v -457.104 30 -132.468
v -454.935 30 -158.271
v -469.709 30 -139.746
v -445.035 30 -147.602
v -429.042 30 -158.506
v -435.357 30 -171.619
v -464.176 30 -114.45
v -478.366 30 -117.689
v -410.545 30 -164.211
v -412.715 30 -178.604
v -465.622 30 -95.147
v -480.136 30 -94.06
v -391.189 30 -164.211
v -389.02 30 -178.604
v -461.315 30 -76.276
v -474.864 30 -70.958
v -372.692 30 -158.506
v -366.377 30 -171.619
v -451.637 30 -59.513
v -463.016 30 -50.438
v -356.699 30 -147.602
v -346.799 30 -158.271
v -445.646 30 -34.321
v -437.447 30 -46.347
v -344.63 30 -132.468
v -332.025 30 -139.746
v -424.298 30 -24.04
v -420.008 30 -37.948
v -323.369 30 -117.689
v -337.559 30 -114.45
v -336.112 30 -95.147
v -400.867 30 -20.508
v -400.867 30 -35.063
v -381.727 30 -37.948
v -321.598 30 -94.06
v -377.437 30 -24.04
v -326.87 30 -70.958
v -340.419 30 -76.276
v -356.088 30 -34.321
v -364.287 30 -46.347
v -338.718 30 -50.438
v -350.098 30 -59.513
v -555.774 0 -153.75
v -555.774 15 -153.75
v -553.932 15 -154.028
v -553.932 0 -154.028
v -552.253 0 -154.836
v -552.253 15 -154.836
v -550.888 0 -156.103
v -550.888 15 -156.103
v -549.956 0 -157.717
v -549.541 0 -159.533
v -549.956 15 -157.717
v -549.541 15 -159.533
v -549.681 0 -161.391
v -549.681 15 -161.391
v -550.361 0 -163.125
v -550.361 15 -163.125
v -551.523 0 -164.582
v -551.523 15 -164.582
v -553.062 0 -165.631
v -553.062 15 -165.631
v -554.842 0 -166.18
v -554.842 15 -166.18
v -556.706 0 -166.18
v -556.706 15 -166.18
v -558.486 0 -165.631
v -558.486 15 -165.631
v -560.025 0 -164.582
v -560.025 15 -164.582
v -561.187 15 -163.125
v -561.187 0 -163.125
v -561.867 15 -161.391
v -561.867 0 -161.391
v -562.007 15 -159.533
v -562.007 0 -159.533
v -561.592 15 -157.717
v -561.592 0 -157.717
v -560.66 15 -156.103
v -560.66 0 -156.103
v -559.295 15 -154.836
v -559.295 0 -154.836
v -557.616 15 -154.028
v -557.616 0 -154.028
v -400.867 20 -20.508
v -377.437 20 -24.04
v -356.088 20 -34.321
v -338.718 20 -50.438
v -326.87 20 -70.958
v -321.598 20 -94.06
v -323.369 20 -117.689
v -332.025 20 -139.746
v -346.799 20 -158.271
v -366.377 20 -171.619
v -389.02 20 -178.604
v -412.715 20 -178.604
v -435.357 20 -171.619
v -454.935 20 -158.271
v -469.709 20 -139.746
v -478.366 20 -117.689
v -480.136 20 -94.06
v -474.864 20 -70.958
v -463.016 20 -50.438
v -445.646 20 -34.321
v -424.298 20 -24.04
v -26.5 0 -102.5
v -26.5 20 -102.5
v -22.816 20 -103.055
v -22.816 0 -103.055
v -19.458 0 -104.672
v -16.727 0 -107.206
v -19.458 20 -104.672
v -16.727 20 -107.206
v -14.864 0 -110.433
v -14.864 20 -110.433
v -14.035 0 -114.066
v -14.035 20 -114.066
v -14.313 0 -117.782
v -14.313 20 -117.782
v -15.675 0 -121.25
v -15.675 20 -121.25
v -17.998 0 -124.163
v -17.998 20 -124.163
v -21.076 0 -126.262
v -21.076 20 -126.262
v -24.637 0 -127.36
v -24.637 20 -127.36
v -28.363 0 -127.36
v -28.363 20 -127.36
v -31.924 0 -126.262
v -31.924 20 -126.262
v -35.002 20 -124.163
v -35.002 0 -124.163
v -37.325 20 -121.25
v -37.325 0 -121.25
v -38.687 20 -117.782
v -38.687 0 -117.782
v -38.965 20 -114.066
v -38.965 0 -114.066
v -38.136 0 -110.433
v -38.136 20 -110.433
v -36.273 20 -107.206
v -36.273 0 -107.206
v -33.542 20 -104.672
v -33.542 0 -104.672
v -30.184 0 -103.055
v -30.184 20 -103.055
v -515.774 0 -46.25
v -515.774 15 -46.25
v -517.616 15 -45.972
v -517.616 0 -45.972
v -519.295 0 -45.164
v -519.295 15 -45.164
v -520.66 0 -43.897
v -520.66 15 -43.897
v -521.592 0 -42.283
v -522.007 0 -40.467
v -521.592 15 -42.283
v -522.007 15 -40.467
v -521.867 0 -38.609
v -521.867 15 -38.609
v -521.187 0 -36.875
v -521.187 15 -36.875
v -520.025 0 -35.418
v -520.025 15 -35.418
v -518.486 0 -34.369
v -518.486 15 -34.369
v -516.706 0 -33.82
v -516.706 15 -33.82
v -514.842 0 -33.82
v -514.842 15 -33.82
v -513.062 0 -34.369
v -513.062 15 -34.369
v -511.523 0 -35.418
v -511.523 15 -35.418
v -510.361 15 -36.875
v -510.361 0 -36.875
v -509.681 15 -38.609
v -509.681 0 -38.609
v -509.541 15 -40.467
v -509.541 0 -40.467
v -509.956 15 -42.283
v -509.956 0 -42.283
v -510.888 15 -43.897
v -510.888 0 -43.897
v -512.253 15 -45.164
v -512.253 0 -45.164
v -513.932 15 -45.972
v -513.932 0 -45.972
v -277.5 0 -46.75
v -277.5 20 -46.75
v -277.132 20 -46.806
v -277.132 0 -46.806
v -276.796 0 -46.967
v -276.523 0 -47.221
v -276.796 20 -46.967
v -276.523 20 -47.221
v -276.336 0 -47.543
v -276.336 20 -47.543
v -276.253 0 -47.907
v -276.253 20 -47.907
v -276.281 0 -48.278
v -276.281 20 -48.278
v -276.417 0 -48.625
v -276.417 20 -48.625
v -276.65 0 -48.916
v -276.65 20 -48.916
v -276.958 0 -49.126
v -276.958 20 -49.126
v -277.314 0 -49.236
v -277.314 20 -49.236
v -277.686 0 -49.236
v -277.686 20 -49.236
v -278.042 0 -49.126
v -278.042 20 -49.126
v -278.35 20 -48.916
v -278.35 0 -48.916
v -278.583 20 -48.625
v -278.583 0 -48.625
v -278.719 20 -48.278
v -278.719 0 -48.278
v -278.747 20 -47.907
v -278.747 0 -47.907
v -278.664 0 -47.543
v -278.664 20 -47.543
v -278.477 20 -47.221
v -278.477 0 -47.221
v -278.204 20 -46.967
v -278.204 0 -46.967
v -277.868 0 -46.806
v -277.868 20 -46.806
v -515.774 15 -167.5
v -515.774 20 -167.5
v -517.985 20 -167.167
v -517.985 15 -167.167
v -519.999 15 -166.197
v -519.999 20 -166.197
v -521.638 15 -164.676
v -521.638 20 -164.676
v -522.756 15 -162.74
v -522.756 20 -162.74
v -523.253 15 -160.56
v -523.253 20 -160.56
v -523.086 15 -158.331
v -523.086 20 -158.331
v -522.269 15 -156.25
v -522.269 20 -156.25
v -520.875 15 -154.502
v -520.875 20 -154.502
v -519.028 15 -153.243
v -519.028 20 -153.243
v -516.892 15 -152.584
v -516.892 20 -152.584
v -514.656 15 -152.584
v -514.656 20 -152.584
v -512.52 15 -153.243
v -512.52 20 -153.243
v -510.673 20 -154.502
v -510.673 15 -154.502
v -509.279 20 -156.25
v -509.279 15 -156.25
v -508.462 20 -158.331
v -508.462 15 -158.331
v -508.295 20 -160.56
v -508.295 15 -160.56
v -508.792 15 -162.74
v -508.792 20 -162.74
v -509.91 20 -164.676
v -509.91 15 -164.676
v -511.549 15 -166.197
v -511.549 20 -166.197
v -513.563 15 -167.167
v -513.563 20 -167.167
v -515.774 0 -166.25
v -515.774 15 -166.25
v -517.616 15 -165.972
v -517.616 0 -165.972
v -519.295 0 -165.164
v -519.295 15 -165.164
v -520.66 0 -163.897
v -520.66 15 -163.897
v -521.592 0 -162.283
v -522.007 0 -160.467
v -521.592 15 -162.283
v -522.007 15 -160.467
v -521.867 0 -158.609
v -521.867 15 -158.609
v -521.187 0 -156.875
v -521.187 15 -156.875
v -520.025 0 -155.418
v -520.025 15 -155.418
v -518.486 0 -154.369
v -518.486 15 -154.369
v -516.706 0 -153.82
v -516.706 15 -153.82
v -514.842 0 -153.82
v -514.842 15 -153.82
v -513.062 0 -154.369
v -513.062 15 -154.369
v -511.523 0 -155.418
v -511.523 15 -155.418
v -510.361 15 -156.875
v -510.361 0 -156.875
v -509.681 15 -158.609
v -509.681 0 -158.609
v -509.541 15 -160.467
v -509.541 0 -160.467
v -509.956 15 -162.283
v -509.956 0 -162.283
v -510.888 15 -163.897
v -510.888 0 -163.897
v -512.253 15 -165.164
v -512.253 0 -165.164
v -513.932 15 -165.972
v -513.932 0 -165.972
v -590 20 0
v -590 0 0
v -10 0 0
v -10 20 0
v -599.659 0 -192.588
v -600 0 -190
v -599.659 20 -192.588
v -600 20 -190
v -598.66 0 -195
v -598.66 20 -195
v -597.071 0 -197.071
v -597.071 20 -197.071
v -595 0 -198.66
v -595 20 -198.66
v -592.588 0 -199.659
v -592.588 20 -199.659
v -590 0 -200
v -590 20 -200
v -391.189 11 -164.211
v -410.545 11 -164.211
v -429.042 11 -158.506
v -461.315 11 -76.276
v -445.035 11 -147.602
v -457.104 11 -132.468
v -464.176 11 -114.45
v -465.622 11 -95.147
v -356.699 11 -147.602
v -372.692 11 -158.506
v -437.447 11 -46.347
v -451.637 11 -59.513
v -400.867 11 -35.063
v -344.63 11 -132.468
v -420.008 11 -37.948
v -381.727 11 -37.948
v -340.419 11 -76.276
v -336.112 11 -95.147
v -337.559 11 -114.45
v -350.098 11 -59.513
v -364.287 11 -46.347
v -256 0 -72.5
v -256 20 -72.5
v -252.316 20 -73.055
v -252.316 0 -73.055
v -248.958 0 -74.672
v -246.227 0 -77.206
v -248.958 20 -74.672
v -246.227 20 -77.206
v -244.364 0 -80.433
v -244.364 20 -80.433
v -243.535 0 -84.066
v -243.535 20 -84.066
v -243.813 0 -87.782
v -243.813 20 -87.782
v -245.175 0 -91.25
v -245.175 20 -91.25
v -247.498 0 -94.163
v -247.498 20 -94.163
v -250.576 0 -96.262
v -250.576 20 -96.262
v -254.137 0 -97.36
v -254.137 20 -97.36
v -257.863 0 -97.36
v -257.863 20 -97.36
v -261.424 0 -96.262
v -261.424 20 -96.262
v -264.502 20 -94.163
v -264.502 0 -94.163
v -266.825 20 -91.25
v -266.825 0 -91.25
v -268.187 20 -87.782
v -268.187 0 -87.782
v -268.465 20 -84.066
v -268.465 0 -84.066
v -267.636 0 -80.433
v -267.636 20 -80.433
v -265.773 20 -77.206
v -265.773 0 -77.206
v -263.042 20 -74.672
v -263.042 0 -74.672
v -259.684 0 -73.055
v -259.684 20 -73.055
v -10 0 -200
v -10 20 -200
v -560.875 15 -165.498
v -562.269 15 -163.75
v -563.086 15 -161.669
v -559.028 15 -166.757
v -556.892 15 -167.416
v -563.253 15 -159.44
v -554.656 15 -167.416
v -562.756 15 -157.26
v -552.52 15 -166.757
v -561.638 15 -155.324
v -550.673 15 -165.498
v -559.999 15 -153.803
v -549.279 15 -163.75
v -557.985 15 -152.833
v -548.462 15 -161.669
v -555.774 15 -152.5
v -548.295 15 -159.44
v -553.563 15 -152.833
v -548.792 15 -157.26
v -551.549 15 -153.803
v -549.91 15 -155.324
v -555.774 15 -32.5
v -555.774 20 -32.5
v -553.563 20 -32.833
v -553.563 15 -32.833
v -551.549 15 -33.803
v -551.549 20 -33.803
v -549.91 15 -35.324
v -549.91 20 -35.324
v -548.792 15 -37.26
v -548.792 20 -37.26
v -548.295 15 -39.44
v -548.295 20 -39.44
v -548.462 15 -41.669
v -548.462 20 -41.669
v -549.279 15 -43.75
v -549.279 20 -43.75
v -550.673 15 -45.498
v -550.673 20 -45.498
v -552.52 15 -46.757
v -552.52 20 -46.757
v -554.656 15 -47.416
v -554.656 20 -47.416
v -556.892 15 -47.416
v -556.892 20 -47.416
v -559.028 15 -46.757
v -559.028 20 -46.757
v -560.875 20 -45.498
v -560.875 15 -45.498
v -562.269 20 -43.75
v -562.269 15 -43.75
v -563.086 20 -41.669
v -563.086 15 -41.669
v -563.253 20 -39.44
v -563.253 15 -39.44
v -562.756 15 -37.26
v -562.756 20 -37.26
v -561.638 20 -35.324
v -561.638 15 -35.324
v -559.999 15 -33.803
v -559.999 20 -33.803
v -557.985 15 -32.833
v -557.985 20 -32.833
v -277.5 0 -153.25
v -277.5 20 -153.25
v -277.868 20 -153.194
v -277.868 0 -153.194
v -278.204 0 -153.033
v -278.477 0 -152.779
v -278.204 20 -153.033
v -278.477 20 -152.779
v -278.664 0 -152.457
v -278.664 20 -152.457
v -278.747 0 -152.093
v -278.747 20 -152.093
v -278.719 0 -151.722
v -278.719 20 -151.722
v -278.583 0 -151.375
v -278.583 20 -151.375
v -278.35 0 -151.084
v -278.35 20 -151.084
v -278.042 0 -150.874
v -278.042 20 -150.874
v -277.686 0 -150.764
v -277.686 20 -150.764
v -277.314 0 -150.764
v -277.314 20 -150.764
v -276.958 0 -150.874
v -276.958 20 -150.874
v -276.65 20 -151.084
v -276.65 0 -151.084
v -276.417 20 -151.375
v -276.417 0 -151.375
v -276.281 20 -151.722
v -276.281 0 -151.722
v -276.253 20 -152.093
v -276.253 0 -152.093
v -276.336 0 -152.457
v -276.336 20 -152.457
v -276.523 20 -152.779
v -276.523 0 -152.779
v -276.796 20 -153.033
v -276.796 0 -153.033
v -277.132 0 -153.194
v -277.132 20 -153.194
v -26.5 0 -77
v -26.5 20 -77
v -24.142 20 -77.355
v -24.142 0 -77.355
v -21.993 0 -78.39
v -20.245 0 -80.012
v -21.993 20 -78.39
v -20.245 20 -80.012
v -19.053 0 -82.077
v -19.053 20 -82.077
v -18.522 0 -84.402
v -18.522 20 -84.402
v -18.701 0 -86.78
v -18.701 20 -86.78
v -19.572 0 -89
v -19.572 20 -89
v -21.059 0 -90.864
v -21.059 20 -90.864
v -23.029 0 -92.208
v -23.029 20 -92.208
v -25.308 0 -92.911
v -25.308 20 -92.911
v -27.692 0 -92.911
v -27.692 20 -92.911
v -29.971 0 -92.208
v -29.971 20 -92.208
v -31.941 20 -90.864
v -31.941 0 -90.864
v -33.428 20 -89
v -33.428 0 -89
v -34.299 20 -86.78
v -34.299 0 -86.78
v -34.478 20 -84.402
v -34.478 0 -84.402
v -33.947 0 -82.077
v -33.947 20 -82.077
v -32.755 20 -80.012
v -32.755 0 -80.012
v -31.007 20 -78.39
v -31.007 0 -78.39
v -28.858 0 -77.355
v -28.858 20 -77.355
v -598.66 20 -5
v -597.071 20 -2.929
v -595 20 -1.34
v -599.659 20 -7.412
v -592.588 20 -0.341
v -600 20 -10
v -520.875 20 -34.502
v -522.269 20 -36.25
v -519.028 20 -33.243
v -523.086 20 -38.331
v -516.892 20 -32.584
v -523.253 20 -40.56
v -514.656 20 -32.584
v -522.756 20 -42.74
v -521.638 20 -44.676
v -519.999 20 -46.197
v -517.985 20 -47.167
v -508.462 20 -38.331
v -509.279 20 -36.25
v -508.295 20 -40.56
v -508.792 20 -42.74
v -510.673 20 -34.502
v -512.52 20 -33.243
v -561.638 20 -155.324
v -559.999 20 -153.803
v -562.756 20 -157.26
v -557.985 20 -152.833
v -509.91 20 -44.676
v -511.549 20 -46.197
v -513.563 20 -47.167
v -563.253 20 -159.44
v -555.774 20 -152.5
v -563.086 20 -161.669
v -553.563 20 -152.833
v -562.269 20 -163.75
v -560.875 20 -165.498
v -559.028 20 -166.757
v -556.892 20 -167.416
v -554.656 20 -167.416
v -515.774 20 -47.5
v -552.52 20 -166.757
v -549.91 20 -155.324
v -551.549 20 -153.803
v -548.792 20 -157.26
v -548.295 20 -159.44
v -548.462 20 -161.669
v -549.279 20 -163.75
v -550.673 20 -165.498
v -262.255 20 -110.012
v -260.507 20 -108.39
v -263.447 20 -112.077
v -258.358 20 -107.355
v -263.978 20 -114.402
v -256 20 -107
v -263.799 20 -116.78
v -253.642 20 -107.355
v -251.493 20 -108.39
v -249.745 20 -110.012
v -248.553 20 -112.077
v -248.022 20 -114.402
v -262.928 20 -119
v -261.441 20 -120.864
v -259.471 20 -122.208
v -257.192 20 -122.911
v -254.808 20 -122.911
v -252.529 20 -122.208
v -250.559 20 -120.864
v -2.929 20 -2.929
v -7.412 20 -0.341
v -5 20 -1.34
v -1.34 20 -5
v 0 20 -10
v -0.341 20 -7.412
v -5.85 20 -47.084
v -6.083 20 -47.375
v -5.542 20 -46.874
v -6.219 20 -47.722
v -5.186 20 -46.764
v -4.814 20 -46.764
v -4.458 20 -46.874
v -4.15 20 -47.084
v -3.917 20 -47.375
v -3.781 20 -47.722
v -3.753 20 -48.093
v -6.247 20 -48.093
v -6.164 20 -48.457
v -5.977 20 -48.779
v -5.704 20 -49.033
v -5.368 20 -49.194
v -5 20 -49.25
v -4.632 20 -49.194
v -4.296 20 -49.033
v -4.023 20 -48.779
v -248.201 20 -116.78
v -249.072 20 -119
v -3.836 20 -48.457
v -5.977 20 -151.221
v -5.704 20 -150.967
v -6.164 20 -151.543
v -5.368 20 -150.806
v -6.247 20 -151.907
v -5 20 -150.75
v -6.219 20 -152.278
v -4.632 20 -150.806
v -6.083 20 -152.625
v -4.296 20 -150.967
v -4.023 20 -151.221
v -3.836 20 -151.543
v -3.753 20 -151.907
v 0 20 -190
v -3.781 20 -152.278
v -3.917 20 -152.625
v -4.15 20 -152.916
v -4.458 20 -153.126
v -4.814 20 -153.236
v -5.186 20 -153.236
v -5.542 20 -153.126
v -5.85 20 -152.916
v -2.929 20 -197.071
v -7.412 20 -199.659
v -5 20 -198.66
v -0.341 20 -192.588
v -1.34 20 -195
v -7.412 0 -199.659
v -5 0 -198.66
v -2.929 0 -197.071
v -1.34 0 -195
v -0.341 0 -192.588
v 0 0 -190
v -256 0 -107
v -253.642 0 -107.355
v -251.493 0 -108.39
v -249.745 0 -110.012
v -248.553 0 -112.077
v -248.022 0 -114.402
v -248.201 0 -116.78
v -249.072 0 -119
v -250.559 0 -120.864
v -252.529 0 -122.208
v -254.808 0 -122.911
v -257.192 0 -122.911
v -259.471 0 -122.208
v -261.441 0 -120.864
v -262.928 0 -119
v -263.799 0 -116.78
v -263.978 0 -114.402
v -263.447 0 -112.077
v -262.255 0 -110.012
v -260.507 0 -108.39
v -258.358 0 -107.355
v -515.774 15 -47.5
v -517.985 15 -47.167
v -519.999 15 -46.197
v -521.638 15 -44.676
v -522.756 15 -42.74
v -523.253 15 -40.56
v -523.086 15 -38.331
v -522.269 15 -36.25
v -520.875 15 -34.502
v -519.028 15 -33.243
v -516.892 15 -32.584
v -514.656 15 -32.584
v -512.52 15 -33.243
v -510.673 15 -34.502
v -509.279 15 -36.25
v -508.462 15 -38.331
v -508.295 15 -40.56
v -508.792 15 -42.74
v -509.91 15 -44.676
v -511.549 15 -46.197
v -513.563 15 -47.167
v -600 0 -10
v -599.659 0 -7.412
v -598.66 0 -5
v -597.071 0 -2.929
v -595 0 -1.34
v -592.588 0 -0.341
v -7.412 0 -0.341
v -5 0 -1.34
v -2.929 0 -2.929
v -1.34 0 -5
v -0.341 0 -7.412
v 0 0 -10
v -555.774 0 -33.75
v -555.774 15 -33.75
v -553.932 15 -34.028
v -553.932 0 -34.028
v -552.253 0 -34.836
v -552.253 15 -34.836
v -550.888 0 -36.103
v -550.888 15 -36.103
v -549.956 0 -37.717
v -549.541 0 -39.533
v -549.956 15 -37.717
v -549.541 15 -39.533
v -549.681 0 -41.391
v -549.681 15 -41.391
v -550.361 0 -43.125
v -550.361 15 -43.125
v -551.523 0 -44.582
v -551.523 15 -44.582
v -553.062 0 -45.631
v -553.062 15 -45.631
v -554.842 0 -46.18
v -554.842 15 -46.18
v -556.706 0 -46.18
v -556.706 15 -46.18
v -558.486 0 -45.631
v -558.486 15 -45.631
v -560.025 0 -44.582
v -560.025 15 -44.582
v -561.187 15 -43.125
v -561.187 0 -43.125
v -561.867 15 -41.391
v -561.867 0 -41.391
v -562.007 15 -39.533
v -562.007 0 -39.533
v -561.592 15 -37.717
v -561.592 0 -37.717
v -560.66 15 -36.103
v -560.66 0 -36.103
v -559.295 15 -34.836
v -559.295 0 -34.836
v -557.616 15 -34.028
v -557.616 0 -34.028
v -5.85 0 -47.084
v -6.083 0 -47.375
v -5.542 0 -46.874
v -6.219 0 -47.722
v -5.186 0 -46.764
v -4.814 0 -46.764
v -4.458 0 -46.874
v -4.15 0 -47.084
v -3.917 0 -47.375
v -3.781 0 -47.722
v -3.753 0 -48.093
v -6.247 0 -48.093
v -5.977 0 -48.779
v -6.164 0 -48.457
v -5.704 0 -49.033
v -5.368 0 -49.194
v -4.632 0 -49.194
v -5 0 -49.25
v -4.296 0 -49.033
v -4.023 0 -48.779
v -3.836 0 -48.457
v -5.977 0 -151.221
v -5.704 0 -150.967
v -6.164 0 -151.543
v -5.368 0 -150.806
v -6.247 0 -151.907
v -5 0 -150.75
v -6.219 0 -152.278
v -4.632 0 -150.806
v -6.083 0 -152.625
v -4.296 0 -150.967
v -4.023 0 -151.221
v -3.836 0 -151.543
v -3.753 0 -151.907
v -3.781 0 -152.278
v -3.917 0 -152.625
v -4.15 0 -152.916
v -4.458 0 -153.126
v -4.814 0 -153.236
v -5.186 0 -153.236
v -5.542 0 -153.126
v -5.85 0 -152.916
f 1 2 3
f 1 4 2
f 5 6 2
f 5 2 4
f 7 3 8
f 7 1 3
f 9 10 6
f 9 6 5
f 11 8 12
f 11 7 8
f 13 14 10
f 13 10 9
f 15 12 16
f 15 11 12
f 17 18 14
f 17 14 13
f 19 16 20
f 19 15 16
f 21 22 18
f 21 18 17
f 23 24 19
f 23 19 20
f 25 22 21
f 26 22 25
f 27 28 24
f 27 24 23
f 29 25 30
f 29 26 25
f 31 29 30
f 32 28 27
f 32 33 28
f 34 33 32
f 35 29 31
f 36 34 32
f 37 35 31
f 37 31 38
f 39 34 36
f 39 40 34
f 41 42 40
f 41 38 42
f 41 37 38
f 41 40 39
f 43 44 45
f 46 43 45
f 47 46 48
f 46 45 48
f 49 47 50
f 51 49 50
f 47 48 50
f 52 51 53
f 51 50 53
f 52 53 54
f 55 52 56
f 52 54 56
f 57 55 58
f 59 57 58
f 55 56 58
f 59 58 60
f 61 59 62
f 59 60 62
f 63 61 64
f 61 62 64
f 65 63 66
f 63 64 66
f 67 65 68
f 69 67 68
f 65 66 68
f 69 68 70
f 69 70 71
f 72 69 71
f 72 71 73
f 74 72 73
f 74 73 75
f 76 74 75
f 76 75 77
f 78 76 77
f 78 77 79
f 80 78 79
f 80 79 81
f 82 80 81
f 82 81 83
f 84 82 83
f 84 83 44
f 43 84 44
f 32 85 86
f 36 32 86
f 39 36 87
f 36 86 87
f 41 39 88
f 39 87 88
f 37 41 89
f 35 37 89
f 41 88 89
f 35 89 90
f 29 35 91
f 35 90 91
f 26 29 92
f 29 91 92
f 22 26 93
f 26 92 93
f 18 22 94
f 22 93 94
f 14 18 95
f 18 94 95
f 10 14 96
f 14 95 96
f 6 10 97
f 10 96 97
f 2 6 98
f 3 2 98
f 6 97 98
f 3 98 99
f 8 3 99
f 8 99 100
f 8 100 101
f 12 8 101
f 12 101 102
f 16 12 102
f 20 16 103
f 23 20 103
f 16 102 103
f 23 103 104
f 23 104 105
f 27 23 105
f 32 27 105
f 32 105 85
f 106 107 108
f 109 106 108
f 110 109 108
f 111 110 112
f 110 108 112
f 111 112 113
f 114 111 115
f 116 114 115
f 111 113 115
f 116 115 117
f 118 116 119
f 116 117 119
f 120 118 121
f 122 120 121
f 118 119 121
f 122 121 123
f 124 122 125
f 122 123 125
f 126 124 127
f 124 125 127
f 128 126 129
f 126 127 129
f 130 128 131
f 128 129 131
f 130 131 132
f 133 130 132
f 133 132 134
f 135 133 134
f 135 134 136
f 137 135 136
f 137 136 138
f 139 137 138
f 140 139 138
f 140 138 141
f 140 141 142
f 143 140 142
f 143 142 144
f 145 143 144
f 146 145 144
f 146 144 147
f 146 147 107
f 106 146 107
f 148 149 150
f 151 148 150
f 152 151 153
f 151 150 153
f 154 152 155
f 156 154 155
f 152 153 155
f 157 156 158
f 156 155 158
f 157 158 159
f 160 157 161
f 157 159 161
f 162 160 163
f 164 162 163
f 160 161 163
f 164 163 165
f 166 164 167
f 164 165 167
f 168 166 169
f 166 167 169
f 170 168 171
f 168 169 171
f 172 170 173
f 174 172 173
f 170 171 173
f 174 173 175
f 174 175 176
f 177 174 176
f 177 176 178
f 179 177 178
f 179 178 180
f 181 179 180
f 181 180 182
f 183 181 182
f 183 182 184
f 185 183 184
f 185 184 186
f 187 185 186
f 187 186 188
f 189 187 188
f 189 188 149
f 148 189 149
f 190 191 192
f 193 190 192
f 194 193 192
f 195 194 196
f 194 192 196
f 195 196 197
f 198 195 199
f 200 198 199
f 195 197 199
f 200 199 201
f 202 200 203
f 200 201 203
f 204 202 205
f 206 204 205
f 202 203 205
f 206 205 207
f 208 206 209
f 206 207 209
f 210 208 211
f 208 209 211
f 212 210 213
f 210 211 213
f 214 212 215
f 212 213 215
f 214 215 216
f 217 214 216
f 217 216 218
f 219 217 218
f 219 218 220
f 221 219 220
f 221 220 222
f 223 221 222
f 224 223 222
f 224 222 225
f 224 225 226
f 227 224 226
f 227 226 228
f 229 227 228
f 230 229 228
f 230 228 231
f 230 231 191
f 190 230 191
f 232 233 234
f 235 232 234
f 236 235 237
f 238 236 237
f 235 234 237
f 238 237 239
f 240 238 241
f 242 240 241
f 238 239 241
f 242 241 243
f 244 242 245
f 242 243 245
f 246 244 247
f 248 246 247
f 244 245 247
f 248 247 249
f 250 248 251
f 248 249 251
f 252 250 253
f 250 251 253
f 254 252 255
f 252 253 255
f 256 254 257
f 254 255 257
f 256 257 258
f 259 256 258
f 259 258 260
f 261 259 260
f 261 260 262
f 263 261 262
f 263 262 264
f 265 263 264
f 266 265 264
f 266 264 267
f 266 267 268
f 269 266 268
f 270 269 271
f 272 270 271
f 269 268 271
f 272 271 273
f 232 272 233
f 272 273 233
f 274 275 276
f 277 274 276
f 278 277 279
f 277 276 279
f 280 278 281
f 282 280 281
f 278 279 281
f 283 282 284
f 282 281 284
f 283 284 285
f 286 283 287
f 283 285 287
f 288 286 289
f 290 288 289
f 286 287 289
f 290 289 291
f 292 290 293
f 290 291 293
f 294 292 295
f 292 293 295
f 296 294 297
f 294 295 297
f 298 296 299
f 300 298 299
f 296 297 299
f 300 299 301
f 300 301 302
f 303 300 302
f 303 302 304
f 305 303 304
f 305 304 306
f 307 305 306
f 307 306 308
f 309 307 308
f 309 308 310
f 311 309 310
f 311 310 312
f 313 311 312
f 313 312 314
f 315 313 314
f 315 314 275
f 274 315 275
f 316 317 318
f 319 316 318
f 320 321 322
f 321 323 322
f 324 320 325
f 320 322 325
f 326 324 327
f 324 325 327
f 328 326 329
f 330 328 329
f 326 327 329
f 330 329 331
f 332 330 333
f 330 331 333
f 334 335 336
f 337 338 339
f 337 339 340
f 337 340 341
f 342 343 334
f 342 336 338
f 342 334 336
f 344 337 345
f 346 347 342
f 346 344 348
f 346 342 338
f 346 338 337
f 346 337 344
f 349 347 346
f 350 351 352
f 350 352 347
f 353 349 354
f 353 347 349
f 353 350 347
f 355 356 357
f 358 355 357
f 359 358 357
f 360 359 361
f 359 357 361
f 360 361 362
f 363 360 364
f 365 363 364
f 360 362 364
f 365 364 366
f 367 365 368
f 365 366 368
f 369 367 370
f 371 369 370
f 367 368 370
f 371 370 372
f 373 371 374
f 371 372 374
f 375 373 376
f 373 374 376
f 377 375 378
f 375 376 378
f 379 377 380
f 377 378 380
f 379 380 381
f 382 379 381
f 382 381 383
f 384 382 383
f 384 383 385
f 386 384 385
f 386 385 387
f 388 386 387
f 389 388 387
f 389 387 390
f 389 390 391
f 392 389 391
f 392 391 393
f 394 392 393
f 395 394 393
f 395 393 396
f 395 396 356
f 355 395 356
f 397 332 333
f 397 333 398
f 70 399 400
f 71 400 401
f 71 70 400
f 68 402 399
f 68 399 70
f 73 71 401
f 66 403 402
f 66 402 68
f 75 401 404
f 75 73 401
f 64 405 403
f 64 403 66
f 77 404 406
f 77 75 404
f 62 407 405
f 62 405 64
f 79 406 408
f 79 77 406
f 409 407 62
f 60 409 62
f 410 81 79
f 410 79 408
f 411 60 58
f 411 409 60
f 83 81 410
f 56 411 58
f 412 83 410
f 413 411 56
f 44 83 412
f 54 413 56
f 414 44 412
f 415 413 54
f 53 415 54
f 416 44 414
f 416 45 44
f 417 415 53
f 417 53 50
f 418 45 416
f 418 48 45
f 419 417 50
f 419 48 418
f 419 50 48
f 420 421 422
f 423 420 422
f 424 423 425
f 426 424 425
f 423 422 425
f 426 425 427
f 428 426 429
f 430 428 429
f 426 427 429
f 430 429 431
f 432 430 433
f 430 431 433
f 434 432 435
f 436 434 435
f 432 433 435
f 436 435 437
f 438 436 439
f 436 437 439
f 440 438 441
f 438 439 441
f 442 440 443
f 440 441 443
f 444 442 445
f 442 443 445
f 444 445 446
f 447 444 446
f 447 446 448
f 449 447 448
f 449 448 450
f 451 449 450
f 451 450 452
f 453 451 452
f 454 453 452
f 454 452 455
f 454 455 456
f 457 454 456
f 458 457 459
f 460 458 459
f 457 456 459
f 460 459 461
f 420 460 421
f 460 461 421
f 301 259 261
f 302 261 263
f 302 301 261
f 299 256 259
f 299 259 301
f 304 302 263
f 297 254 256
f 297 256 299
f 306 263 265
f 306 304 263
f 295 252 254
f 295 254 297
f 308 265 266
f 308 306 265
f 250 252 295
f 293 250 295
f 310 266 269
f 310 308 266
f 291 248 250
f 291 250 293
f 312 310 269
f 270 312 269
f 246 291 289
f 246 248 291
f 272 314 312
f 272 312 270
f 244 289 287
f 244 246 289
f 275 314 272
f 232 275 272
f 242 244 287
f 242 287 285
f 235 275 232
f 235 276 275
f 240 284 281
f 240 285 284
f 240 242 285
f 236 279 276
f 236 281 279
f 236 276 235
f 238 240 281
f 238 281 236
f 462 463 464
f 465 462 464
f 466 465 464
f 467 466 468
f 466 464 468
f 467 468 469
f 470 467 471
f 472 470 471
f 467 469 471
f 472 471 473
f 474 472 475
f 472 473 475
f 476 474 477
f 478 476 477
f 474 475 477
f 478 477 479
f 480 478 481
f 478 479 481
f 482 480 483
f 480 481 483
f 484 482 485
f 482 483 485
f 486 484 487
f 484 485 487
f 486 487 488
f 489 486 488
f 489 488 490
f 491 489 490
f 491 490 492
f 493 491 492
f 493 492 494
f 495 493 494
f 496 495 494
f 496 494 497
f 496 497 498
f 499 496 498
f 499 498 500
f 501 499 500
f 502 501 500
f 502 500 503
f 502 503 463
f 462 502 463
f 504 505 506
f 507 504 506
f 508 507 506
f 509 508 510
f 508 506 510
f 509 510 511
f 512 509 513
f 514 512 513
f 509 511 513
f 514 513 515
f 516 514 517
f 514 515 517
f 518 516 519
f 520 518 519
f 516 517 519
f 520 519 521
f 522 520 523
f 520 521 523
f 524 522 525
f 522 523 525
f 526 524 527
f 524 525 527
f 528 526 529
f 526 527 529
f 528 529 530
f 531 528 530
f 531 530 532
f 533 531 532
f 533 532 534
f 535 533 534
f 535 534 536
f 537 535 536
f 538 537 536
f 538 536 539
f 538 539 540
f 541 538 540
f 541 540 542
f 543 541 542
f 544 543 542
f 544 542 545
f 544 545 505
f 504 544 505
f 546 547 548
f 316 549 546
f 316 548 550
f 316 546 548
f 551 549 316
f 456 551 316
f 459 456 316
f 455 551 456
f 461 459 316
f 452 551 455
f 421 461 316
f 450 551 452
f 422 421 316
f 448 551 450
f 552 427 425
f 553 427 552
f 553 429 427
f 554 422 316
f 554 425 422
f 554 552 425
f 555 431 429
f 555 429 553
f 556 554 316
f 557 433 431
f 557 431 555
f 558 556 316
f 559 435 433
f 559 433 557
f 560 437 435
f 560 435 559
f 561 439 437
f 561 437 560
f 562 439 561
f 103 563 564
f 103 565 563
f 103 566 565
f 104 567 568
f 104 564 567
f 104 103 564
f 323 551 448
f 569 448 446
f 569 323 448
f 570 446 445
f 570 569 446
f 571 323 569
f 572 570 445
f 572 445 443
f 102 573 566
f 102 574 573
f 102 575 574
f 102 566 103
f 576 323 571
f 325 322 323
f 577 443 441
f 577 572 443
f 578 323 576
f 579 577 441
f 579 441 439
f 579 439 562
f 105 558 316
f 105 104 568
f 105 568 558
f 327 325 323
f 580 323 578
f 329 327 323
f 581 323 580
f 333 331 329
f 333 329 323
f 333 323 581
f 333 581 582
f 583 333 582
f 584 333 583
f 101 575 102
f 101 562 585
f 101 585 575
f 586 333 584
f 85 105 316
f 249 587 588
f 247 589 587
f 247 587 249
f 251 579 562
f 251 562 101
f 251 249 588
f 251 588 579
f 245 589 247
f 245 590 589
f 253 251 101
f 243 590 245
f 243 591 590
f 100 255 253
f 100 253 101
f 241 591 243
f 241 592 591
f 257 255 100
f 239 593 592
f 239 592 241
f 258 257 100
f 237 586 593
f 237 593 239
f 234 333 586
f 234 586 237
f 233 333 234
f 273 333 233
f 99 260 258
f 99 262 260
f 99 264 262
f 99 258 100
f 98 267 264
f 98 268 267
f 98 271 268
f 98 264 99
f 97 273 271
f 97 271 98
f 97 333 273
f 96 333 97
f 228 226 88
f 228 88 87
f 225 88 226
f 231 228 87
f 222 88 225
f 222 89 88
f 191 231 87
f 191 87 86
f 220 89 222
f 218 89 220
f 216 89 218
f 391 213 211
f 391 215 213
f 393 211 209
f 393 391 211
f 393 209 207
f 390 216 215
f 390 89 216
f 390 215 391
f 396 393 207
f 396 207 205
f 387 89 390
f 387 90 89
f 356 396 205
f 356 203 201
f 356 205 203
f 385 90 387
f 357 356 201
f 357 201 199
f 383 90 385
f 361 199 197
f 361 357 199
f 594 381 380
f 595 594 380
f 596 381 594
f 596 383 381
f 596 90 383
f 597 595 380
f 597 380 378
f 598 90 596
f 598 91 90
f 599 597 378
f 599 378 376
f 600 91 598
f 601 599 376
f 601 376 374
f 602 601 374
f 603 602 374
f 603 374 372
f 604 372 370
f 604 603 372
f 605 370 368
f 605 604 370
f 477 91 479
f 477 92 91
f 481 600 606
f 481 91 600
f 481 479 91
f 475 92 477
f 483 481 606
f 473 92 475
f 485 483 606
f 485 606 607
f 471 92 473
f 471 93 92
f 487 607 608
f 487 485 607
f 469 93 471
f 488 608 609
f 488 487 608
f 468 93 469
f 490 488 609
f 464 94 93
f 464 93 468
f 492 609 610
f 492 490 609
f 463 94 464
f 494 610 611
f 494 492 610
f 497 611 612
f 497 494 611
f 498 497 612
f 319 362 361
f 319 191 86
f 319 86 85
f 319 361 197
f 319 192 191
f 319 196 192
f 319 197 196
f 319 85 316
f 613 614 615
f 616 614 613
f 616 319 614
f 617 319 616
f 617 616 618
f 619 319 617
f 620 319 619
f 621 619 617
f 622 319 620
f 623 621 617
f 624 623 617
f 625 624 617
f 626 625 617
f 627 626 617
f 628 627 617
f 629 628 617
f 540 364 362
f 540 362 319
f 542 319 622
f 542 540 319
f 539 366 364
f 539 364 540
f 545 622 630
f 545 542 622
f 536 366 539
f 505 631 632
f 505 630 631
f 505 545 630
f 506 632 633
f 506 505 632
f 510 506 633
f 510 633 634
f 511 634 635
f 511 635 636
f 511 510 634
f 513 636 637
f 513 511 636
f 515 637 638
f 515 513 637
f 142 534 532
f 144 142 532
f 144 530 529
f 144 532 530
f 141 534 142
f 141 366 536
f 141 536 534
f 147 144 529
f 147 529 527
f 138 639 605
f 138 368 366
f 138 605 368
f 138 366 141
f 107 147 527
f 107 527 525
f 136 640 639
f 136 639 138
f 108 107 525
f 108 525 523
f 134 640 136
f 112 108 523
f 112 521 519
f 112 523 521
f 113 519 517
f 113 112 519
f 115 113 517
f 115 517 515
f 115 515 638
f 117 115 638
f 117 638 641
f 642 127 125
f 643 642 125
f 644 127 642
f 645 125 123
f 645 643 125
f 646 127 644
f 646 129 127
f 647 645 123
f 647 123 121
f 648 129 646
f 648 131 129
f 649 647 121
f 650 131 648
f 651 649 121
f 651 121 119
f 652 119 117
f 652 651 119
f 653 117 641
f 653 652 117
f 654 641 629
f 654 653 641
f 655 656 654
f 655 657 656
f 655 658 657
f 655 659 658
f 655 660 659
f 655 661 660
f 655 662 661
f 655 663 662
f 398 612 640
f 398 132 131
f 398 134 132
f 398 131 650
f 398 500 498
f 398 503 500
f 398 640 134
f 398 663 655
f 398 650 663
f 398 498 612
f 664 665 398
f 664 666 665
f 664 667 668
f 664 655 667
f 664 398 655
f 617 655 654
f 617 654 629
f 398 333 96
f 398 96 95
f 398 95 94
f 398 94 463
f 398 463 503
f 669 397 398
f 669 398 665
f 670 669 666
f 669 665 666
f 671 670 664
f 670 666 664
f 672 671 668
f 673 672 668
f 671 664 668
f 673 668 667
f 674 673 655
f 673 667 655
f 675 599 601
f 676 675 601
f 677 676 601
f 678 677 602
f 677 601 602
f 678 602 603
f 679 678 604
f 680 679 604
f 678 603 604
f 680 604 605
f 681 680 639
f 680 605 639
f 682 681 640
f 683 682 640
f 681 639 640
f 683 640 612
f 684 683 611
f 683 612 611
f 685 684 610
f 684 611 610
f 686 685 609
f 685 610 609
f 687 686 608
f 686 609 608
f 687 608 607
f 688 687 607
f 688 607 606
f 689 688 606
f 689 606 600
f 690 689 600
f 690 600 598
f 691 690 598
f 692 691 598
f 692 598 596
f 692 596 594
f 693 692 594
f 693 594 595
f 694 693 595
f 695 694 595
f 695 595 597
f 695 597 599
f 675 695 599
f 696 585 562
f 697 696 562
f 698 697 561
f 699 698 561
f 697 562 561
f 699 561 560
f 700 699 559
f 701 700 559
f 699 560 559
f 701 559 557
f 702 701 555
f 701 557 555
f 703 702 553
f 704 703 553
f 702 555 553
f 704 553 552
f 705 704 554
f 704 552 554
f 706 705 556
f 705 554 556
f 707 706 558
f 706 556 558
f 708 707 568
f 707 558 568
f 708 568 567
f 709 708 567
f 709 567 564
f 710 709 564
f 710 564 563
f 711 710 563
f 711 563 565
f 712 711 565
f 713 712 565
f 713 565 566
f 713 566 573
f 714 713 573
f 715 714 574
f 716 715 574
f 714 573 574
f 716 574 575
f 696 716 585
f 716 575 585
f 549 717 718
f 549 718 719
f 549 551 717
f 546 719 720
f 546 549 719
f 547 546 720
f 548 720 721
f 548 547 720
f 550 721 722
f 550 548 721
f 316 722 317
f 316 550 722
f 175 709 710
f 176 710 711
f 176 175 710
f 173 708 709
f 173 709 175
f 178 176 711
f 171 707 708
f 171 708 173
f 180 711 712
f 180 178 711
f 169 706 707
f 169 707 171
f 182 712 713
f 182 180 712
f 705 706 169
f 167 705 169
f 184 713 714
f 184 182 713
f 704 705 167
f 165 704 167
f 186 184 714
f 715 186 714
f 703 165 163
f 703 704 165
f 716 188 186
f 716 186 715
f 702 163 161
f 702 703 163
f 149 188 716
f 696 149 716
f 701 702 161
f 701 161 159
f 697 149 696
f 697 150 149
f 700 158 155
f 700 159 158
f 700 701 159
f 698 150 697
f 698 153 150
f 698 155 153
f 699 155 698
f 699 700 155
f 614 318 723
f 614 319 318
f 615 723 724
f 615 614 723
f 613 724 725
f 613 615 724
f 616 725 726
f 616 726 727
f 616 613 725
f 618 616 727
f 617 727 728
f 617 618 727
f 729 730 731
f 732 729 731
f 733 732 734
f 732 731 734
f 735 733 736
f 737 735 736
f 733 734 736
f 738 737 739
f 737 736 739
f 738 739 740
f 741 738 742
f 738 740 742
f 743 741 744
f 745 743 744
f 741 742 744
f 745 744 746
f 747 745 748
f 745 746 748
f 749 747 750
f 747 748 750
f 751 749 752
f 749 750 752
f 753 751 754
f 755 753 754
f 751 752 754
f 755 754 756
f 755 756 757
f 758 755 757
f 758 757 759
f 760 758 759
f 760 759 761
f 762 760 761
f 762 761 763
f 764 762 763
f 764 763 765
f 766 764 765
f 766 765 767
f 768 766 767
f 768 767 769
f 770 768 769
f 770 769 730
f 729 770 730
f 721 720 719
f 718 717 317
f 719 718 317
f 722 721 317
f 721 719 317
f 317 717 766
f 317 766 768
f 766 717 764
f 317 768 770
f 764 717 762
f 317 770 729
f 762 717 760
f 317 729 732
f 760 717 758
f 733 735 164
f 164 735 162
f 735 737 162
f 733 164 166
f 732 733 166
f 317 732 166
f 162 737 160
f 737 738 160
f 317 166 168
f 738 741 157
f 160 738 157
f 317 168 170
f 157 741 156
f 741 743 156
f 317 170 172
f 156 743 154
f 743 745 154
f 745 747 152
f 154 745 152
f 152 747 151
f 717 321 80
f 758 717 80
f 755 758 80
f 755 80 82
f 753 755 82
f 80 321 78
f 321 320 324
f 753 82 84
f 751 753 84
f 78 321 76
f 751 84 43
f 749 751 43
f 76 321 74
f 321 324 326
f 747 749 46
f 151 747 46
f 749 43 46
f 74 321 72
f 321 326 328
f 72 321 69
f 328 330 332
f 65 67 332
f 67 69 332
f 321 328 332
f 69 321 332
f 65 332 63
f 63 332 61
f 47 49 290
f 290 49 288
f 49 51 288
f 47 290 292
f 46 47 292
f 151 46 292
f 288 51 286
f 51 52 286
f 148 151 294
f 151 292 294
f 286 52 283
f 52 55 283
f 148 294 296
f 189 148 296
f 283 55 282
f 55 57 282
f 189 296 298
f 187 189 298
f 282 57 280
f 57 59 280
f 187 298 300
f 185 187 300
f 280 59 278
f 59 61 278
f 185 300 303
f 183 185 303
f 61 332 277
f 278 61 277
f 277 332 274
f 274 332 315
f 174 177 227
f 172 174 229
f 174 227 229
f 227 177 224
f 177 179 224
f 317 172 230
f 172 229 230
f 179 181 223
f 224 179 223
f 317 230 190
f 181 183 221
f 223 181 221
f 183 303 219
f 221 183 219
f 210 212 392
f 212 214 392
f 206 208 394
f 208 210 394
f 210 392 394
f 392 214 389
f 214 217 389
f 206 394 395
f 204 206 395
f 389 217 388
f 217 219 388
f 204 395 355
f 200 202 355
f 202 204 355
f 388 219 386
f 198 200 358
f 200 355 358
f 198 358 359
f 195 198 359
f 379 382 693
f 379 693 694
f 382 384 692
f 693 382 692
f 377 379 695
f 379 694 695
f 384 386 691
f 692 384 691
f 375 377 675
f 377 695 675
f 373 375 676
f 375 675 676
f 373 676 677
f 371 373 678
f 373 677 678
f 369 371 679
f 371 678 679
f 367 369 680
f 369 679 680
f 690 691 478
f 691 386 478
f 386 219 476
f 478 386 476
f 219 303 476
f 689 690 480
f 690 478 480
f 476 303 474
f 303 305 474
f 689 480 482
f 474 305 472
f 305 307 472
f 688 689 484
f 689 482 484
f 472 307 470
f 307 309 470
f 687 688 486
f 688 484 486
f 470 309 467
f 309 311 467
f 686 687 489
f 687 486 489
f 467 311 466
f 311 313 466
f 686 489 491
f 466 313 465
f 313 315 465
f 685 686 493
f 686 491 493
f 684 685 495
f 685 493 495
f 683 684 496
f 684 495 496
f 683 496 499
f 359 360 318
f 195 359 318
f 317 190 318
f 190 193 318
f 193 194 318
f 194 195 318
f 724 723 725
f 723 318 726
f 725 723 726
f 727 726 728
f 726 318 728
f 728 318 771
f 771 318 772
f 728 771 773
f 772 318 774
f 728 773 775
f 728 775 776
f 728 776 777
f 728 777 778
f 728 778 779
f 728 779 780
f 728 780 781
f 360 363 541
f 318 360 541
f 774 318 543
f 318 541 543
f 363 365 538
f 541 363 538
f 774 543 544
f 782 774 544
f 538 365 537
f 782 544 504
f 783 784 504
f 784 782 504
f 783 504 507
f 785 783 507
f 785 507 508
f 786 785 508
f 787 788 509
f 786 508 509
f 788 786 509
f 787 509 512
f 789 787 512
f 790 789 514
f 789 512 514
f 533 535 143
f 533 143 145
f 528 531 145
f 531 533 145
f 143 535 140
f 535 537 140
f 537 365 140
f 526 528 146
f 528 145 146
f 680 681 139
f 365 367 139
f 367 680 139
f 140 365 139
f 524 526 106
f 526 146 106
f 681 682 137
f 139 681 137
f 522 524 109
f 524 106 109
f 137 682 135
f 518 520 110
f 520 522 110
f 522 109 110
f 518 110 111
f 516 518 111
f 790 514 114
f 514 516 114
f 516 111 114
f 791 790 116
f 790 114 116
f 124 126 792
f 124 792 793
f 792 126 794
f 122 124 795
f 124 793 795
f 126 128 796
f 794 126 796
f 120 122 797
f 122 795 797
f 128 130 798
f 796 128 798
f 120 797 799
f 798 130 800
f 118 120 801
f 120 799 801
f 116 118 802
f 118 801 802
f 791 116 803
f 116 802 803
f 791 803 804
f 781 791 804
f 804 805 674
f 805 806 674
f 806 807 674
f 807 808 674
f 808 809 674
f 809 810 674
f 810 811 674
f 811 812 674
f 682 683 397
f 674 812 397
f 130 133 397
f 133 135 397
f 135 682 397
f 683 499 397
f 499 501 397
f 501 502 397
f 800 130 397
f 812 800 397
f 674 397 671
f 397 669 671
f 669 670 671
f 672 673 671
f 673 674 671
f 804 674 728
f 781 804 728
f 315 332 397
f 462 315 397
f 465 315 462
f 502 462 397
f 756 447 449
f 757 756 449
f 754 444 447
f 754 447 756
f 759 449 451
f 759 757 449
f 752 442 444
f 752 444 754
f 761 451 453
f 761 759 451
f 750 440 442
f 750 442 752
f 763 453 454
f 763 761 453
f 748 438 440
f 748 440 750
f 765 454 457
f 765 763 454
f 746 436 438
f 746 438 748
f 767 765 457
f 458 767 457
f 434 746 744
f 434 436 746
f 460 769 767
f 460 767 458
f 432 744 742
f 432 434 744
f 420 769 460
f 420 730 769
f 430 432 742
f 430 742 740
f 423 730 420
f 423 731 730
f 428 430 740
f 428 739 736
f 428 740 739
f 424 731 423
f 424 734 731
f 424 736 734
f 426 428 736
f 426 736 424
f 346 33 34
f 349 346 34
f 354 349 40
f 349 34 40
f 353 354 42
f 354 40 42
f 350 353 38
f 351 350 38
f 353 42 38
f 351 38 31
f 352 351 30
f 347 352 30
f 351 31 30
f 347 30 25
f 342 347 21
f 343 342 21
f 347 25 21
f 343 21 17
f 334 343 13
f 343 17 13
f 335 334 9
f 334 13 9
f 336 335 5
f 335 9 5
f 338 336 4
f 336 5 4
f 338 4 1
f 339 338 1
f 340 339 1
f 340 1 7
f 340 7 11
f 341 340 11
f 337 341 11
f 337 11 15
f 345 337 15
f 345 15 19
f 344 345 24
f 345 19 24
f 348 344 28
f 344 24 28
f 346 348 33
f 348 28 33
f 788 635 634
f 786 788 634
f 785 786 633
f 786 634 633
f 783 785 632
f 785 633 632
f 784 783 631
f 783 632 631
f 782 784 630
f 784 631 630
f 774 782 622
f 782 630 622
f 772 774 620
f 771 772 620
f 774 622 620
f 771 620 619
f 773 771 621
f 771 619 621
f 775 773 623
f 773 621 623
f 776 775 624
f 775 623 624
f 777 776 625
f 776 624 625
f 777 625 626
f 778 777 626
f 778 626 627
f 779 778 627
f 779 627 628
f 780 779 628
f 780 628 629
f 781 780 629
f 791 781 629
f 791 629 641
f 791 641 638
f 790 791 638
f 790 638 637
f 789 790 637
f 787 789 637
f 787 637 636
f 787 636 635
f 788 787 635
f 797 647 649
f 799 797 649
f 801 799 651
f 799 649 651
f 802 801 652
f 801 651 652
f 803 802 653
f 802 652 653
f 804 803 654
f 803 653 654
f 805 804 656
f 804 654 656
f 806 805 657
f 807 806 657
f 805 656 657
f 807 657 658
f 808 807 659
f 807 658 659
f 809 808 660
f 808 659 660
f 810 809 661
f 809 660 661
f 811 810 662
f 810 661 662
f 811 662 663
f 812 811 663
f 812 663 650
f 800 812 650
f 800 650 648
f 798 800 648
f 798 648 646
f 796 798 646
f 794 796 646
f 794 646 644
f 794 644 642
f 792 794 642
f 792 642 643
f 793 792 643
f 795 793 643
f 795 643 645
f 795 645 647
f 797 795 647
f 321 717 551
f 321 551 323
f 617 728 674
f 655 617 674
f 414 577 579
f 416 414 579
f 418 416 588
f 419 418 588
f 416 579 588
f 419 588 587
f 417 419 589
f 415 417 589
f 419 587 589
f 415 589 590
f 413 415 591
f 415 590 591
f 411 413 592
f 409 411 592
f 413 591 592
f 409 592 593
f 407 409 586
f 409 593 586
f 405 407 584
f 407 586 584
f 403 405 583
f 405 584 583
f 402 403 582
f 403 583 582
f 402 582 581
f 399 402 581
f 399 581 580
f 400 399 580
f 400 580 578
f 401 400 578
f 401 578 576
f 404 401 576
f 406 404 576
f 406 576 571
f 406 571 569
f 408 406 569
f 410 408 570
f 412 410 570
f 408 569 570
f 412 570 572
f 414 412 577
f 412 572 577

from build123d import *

# Parameters (mm, degrees)
SKETCH1_W           = 600
SKETCH1_H           = 200
BOSS_EXTRUDE1_DEPTH = 20
SKETCH2_R           = 6.25
CUT_EXTRUDE1_DEPTH  = 633.771680782
SKETCH4_R           = 7.5
CUT_EXTRUDE2_DEPTH  = 5
SKETCH5_R           = 1.25
CUT_EXTRUDE3_DEPTH  = 633.771680782
FILLET1_R           = 10
SKETCH6_R           = 79.491583248
BOSS_EXTRUDE2_DEPTH = 10
SKETCH7_R           = 64.936608028
CUT_EXTRUDE4_DEPTH  = 19
SKETCH8_R           = 12.5
SKETCH8_R_2         = 8
CUT_EXTRUDE5_DEPTH  = 633.771680782


with BuildPart() as part:
    # Sketch1 → Boss-Extrude1 (new body)
    with BuildSketch(Plane(origin=(0, 0, 0), x_dir=(1, 0, 0), z_dir=(0, 1, 0))):
        with Locations((-300, 100)):
            Rectangle(SKETCH1_W, SKETCH1_H)
    extrude(amount=BOSS_EXTRUDE1_DEPTH)

    # Sketch2 → Cut-Extrude1 (cut, through all)
    with BuildSketch(Plane(origin=(0, 20, 0), x_dir=(1, 0, 0), z_dir=(0, 1, 0))):
        with Locations(Location((-555.774, 160, 0), (0, 0, 270))):
            Circle(SKETCH2_R)
        with Locations(Location((-555.774, 40, 0), (0, 0, 270))):
            Circle(SKETCH2_R)
        with Locations(Location((-515.774, 40, 0), (0, 0, 90))):
            Circle(SKETCH2_R)
        with Locations(Location((-515.774, 160, 0), (0, 0, 90))):
            Circle(SKETCH2_R)
    extrude(amount=-CUT_EXTRUDE1_DEPTH, mode=Mode.SUBTRACT)

    # Sketch4 → Cut-Extrude2 (cut)
    with BuildSketch(Plane(origin=(0, 20, 0), x_dir=(1, 0, 0), z_dir=(0, 1, 0))):
        with Locations(Location((-555.774, 160, 0), (0, 0, 270))):
            Circle(SKETCH4_R)
        with Locations(Location((-555.774, 40, 0), (0, 0, 270))):
            Circle(SKETCH4_R)
        with Locations(Location((-515.774, 40, 0), (0, 0, 90))):
            Circle(SKETCH4_R)
        with Locations(Location((-515.774, 160, 0), (0, 0, 90))):
            Circle(SKETCH4_R)
    extrude(amount=-CUT_EXTRUDE2_DEPTH, mode=Mode.SUBTRACT)

    # Sketch5 → Cut-Extrude3 (cut, through all)
    with BuildSketch(Plane(origin=(0, 20, 0), x_dir=(1, 0, 0), z_dir=(0, 1, 0))):
        with Locations(Location((-277.5, 48, 0), (0, 0, 270))):
            Circle(SKETCH5_R)
        with Locations(Location((-277.5, 152, 0), (0, 0, 90))):
            Circle(SKETCH5_R)
        with Locations(Location((-5, 48, 0), (0, 0, 90))):
            Circle(SKETCH5_R)
        with Locations(Location((-5, 152, 0), (0, 0, 270))):
            Circle(SKETCH5_R)
    extrude(amount=-CUT_EXTRUDE3_DEPTH, mode=Mode.SUBTRACT)

    # Fillet1
    fillet1_edges = [part.edges().sort_by_distance(p)[0] for p in [
        (0, 10, 0),
        (-600, 10, 0),
        (-600, 10, -200),
        (0, 10, -200),
    ]]
    fillet(fillet1_edges, radius=FILLET1_R)

    # Sketch6 → Boss-Extrude2 (add)
    with BuildSketch(Plane(origin=(0, 20, 0), x_dir=(1, 0, 0), z_dir=(0, 1, 0))):
        with Locations(Location((-400.867107023, 100, 0), (0, 0, 270))):
            Circle(SKETCH6_R)
    extrude(amount=BOSS_EXTRUDE2_DEPTH)

    # Sketch7 → Cut-Extrude4 (cut)
    with BuildSketch(Plane(origin=(0, 30, 0), x_dir=(1, 0, 0), z_dir=(0, 1, 0))):
        with Locations(Location((-400.867107023, 100, 0), (0, 0, 270))):
            Circle(SKETCH7_R)
    extrude(amount=-CUT_EXTRUDE4_DEPTH, mode=Mode.SUBTRACT)

    # Sketch8 → Cut-Extrude5 (cut, through all)
    with BuildSketch(Plane(origin=(0, 20, 0), x_dir=(1, 0, 0), z_dir=(0, 1, 0))):
        with Locations(Location((-26.5, 115, 0), (0, 0, 270))):
            Circle(SKETCH8_R)
        with Locations(Location((-26.5, 85, 0), (0, 0, 270))):
            Circle(SKETCH8_R_2)
        with Locations(Location((-256, 115, 0), (0, 0, 270))):
            Circle(SKETCH8_R_2)
        with Locations(Location((-256, 85, 0), (0, 0, 270))):
            Circle(SKETCH8_R)
    extrude(amount=-CUT_EXTRUDE5_DEPTH, mode=Mode.SUBTRACT)


solid = part.part
